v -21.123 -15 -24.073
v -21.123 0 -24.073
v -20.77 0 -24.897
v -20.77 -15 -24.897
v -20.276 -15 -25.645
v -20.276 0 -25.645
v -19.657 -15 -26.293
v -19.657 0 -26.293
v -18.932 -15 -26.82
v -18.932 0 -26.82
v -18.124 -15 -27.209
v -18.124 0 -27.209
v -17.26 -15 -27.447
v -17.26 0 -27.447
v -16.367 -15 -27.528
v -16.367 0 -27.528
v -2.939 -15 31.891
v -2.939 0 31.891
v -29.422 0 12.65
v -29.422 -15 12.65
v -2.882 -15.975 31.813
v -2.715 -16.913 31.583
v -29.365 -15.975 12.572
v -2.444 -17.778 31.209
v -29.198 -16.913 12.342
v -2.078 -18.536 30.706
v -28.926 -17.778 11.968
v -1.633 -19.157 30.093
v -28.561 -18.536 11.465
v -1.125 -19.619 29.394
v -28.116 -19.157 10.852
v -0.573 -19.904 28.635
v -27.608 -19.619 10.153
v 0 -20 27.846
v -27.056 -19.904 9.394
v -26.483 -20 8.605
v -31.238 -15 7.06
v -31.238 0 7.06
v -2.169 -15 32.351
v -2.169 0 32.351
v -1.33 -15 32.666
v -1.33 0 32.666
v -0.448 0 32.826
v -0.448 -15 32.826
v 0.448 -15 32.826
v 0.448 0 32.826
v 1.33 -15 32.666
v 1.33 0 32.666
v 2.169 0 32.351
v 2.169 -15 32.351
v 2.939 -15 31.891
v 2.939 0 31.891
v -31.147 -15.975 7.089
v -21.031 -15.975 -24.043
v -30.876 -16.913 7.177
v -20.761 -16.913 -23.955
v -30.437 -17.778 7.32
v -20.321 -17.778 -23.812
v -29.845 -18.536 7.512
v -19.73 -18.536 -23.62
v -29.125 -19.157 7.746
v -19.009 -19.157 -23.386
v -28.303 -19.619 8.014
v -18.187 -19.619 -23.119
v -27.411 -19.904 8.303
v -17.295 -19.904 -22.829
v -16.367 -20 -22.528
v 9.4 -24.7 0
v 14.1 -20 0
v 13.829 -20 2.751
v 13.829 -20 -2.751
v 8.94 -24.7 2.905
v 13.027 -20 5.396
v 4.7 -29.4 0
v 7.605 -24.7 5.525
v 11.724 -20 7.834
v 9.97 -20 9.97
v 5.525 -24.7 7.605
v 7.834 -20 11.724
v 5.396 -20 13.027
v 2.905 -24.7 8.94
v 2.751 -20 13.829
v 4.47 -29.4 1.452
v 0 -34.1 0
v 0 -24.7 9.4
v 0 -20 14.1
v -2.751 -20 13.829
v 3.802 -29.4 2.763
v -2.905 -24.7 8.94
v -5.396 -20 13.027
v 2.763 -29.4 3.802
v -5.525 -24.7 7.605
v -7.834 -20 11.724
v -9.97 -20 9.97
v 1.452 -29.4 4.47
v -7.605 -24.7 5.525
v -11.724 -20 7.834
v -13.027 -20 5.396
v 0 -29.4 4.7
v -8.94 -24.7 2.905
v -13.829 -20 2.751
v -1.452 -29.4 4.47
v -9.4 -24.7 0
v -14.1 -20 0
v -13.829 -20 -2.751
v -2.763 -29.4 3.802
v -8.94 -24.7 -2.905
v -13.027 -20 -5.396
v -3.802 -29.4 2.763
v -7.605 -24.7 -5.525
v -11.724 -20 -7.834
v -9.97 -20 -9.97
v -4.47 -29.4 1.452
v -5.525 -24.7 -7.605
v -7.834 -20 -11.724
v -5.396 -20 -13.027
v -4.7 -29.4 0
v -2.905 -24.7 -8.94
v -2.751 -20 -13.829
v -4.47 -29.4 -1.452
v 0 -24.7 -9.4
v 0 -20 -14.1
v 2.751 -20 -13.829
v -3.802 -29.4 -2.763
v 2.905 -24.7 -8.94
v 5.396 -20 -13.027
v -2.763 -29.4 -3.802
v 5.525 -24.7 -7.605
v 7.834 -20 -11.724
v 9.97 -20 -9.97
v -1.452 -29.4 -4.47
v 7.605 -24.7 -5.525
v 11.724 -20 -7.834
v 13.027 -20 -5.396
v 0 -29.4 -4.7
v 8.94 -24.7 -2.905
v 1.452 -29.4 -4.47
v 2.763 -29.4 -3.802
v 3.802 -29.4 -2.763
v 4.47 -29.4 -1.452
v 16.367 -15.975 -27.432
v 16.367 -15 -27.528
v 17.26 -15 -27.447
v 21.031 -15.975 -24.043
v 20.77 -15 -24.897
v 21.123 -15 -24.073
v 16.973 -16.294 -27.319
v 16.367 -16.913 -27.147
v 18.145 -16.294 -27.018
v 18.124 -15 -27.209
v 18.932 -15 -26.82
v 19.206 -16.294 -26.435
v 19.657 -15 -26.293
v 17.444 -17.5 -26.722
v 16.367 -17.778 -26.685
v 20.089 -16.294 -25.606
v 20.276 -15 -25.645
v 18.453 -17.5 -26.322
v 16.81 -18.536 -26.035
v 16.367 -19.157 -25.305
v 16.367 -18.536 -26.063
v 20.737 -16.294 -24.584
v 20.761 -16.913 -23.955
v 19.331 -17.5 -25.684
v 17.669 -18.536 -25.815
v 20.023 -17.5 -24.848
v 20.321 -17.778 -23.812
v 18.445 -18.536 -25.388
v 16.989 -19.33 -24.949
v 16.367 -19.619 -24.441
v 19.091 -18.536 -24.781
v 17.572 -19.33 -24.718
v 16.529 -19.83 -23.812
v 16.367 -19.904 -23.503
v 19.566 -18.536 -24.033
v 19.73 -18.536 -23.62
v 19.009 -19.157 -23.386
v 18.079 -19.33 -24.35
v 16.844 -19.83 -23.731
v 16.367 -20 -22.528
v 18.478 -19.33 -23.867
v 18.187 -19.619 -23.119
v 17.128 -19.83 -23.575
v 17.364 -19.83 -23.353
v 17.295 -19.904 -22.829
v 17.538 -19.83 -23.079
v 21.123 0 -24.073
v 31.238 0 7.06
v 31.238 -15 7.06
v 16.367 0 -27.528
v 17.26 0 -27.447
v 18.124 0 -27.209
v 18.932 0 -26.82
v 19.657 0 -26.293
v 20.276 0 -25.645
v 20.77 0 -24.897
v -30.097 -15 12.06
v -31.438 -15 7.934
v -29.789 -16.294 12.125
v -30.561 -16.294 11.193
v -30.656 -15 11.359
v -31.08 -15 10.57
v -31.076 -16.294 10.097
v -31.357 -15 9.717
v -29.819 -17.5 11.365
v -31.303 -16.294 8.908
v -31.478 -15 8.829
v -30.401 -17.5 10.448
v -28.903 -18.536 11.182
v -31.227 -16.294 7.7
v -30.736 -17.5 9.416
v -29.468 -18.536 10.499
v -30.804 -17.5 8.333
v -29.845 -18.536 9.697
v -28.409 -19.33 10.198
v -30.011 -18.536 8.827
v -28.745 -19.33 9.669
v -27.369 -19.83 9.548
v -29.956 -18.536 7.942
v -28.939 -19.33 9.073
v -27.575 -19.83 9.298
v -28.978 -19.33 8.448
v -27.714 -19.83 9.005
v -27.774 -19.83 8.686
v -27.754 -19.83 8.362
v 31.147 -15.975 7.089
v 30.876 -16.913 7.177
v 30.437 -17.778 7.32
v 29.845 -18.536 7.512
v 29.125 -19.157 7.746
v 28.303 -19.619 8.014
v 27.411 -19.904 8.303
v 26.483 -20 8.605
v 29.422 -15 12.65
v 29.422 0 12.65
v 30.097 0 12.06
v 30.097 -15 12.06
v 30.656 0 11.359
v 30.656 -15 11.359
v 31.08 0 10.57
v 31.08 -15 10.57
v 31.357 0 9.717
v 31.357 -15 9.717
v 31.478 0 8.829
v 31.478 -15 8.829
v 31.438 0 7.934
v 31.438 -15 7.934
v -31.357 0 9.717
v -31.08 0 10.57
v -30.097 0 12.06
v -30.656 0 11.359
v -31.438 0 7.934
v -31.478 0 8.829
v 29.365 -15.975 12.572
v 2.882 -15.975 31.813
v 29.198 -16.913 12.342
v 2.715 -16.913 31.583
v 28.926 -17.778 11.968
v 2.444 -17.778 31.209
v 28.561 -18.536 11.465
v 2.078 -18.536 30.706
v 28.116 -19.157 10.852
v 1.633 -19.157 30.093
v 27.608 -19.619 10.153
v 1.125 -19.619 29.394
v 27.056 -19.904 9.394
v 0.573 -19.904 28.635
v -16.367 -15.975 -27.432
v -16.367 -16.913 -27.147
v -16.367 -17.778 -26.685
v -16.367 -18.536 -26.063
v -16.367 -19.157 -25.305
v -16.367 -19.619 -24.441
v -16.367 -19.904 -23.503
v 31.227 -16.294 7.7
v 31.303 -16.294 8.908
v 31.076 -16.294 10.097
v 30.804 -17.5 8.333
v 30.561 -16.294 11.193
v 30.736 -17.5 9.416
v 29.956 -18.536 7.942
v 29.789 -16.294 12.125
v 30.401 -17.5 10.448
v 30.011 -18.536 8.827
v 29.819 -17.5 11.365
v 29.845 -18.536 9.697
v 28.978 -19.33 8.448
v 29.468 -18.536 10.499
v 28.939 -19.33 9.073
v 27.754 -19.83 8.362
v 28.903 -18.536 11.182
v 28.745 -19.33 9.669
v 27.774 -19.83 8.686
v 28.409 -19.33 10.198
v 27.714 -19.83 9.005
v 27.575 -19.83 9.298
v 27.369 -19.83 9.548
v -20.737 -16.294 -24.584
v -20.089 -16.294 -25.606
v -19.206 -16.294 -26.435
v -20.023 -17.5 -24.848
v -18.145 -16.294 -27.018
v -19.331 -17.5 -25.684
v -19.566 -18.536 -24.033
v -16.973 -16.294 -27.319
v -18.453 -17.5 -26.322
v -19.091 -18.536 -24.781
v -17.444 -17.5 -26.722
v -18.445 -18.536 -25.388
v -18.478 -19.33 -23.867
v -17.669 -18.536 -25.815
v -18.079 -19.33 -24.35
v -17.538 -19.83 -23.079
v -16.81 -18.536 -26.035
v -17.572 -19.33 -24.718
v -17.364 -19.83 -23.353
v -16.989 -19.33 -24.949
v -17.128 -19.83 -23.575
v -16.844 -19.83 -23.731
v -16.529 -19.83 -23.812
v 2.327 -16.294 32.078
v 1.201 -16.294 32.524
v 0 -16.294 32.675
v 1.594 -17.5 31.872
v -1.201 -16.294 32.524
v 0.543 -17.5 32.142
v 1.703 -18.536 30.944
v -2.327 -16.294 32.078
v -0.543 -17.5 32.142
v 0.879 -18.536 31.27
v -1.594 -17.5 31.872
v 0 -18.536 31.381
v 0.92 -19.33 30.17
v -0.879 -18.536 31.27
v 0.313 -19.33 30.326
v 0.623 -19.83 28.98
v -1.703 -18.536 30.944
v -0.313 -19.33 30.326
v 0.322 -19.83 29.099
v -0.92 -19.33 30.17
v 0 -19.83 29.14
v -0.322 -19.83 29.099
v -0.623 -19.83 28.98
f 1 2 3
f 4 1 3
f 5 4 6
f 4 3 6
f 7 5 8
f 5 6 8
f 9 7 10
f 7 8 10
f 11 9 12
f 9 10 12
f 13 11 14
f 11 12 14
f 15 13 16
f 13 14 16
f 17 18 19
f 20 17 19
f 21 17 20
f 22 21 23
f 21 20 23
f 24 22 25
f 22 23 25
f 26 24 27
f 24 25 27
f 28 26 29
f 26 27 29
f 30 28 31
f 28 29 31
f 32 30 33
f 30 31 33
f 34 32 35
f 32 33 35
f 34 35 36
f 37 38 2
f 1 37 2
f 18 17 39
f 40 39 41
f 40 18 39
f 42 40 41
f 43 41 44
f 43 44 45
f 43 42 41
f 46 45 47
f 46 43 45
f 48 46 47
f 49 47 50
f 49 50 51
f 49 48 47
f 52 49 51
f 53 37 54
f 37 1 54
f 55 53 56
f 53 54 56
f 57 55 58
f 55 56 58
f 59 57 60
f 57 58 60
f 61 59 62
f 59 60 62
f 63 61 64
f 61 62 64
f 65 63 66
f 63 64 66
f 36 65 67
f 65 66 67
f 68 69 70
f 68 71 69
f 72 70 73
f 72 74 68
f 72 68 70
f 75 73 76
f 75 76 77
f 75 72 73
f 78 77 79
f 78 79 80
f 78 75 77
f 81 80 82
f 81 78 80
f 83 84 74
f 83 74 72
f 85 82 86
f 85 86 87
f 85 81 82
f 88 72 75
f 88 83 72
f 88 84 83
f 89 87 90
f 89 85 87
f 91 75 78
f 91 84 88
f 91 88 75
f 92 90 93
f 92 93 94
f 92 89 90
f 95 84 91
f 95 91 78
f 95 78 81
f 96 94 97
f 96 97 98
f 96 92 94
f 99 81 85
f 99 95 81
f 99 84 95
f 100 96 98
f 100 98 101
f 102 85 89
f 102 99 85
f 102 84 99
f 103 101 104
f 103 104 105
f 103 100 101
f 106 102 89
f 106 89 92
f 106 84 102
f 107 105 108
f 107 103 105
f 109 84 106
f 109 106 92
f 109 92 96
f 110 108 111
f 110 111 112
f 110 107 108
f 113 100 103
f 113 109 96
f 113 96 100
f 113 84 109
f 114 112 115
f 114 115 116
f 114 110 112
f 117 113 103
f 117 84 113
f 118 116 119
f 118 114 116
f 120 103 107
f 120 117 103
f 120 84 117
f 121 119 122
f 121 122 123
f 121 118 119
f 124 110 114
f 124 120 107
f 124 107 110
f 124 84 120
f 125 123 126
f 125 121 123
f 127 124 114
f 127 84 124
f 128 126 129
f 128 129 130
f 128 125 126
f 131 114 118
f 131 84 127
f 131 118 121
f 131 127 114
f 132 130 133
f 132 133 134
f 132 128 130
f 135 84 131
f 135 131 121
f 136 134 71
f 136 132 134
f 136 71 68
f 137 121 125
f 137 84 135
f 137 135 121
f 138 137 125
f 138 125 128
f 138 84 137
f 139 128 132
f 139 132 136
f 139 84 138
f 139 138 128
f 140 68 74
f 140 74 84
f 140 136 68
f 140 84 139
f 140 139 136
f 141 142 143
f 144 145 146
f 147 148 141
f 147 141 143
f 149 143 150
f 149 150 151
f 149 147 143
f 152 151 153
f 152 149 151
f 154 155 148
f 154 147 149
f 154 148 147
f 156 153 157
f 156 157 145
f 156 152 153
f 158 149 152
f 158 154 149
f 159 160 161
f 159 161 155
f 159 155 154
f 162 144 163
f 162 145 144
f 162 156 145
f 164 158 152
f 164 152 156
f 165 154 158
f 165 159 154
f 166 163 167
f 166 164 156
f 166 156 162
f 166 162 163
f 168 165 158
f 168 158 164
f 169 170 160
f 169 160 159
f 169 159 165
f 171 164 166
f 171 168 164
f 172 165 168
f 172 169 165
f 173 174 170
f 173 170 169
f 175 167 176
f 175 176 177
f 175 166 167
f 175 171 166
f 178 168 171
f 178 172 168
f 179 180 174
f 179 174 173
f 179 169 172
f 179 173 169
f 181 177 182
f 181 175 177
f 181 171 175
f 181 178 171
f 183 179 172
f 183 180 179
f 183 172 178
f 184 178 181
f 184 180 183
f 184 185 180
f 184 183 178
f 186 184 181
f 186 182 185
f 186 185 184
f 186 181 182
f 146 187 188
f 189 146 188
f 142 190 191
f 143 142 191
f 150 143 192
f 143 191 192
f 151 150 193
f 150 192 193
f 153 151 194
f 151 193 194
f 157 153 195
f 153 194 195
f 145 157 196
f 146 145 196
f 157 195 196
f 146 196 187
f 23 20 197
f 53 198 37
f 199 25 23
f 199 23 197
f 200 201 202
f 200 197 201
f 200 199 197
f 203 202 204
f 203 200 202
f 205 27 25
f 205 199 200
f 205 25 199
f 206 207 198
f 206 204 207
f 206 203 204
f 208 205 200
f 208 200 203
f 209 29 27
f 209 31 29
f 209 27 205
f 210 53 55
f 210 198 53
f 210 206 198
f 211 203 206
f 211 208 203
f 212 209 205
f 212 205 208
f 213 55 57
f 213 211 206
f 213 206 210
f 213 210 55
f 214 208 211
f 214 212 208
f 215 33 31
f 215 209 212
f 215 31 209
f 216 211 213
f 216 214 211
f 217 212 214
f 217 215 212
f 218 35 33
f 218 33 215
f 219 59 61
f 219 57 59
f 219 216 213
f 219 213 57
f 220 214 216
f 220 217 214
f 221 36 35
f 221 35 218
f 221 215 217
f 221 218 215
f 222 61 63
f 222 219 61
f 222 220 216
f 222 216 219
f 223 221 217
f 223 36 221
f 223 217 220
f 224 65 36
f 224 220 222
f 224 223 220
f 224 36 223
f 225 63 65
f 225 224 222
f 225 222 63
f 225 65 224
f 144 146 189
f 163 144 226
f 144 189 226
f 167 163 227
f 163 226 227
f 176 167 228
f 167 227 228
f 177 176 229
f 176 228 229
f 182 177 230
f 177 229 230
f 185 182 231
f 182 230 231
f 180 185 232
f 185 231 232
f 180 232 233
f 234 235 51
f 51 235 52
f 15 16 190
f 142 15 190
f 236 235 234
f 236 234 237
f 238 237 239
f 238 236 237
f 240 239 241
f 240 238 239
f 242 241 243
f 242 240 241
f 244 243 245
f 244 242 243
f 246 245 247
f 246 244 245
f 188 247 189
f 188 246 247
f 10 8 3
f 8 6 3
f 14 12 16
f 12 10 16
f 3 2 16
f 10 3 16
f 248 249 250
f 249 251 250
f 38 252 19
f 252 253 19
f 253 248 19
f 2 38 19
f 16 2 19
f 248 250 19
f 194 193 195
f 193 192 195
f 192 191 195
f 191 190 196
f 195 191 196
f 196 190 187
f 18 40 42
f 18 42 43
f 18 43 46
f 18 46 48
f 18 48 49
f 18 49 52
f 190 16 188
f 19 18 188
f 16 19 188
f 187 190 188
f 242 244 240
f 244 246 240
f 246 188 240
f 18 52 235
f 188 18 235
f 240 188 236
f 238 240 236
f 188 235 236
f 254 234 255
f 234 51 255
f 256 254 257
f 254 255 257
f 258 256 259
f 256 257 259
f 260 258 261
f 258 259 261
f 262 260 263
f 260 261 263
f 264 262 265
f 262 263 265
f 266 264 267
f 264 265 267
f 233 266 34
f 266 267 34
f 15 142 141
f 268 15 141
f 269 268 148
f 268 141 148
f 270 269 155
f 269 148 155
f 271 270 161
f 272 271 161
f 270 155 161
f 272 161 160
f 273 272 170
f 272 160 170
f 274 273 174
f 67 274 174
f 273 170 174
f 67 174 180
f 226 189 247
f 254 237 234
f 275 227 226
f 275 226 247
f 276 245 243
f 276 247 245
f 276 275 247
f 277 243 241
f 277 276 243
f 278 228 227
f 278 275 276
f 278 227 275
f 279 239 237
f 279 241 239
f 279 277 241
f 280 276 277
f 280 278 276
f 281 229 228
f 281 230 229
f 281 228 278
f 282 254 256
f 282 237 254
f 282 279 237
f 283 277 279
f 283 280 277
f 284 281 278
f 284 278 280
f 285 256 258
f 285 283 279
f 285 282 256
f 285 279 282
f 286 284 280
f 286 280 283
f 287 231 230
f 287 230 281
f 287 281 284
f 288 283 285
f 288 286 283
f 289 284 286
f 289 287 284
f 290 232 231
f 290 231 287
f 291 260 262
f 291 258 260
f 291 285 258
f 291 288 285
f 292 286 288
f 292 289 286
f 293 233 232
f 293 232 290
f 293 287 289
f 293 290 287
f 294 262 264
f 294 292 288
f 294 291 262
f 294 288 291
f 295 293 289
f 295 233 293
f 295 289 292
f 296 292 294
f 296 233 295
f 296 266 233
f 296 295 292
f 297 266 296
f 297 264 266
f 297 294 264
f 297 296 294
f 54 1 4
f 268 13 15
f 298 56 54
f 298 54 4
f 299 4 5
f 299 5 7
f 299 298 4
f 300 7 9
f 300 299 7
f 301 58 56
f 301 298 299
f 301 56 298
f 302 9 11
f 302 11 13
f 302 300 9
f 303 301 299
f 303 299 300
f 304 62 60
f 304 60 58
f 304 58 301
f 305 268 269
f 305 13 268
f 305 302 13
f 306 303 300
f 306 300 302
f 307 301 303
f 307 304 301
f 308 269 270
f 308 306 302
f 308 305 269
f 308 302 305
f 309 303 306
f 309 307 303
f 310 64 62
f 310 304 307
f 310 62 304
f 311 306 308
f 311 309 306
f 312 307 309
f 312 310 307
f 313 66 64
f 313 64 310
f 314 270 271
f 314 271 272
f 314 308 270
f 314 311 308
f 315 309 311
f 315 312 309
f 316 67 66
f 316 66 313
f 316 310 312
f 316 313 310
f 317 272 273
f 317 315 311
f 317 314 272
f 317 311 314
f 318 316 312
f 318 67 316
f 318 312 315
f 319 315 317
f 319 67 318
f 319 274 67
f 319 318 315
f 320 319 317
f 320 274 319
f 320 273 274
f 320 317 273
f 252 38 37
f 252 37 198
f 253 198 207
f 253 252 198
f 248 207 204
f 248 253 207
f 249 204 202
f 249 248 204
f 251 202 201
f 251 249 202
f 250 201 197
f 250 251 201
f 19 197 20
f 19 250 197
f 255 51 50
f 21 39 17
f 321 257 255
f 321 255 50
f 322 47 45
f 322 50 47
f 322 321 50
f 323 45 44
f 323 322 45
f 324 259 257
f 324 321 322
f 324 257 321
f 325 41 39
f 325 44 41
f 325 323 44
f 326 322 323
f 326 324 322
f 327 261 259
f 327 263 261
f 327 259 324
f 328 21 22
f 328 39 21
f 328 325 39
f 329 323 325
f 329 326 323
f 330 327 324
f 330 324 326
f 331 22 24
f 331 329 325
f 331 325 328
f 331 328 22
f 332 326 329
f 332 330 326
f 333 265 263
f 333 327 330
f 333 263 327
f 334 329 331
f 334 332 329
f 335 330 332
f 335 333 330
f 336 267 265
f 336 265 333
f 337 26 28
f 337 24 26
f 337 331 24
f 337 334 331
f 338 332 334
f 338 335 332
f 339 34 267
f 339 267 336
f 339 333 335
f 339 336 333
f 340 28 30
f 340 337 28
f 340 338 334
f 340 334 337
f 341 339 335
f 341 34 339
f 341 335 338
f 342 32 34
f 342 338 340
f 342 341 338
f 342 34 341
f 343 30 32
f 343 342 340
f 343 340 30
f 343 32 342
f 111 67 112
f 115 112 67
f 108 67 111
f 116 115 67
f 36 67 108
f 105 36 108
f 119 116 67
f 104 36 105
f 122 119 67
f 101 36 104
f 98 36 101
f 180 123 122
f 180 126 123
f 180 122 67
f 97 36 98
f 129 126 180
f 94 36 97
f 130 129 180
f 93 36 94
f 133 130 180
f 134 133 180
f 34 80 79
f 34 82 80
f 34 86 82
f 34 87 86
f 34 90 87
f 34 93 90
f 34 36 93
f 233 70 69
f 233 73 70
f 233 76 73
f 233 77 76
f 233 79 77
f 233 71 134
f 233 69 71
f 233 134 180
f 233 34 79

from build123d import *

# Parameters (mm, degrees)
F0_R         = 15
F1_DEPTH     = 20
F2_R         = 5
F3_T1_DEPTH  = 24.0817816001
F3_T6_DEPTH  = 5
F3_T12_DEPTH = 5
F3_T18_DEPTH = 5
F3_T24_DEPTH = 5
F3_T30_DEPTH = 5
F4_DEPTH     = 34.1


# Not quite as in the source:
# - a fillet or chamfer that OpenCascade refuses, or shapes differently, is made with other operations: its cross-section is extruded or revolved along the edge and cut away or added


with BuildPart() as f1:
    # F0 (on Front) → F1 (new body)
    with BuildSketch(Plane.XZ):
        Polygon((-20, -27.5276384094), (20, -27.5276384094), (32.360679775, 10.5146222424), (0, 34.0260323341), (-32.360679775, 10.5146222424), align=None)
        Circle(F0_R, mode=Mode.SUBTRACT)
    extrude(amount=F1_DEPTH)

    # F2
    f2_edges = [f1.edges().sort_by_distance(p)[0] for p in [
        (-26.18034, -20, -8.506508),
        (0, -20, -27.527638),
        (26.18034, -20, -8.506508),
        (16.18034, -20, 22.270327),
        (-16.18034, -20, 22.270327),
    ]]
    fillet(f2_edges, radius=F2_R)

    # F3: fillet of radius 5 on 5 edges, made by hand

    # F3_s2 → F3_t1 (cut)
    with BuildSketch(Plane.XZ.offset(-9.0817816001)):
        with BuildLine():
            ThreePointArc((16.36728736, -27.5276384094), (19.3062136214, -26.5727233813), (21.1225699414, -24.0727233813))
            Line((21.1225699414, -24.0727233813), (20, -27.5276384094))
            Line((20, -27.5276384094), (16.36728736, -27.5276384094))
        make_face()
        with BuildLine():
            ThreePointArc((29.4217535135, 12.649877158), (31.2381098335, 10.149877158), (31.2381098335, 7.0597072143))
            Line((31.2381098335, 7.0597072143), (32.360679775, 10.5146222424))
            Line((32.360679775, 10.5146222424), (29.4217535135, 12.649877158))
        make_face()
        with BuildLine():
            ThreePointArc((-2.9389262615, 31.8907774185), (0, 32.8456924466), (2.9389262615, 31.8907774185))
            Line((2.9389262615, 31.8907774185), (0, 34.0260323341))
            Line((0, 34.0260323341), (-2.9389262615, 31.8907774185))
        make_face()
        with BuildLine():
            ThreePointArc((-31.2381098335, 7.0597072143), (-31.2381098335, 10.149877158), (-29.4217535135, 12.649877158))
            Line((-29.4217535135, 12.649877158), (-32.360679775, 10.5146222424))
            Line((-32.360679775, 10.5146222424), (-31.2381098335, 7.0597072143))
        make_face()
        with BuildLine():
            ThreePointArc((-21.1225699414, -24.0727233813), (-19.3062136214, -26.5727233813), (-16.36728736, -27.5276384094))
            Line((-16.36728736, -27.5276384094), (-20, -27.5276384094))
            Line((-20, -27.5276384094), (-21.1225699414, -24.0727233813))
        make_face()
    extrude(amount=F3_T1_DEPTH, mode=Mode.SUBTRACT)


with BuildPart() as f3_tool4:
    # F3_s5 → F3_t6 (new body)
    with BuildSketch(Plane.XZ.offset(15)):
        Polygon((-16.36728736, -22.5276384094), (-21.1225699414, -24.0727233813), (-20, -27.5276384094), (-16.36728736, -27.5276384094), align=None)
    extrude(amount=F3_T6_DEPTH)

    # F3_s7 → F3_t8 (revolve, cut)
    with BuildSketch(Plane(origin=(-16.36728736, -15, -22.5276384094), x_dir=(0.5877852523, 0, 0.8090169944), z_dir=(0.8090169944, 0, -0.5877852523))):
        with BuildLine():
            ThreePointArc((0, -5), (5, 0), (0, 5))
            Line((0, 5), (0, -5))
        make_face()
    revolve(axis=Axis((-16.36728736, -15, -22.5276384094), (0, -1, 0)), mode=Mode.SUBTRACT)


with BuildPart() as f1_1:
    add(f1.part)

    # F3_t3: cut F3_tool4
    add(f3_tool4.part, mode=Mode.SUBTRACT)


with BuildPart() as f3_tool10:
    # F3_s11 → F3_t12 (new body)
    with BuildSketch(Plane.XZ.offset(15)):
        Polygon((-26.4828272521, 8.6047921861), (-31.2381098335, 7.0597072143), (-32.360679775, 10.5146222424), (-29.4217535135, 12.649877158), align=None)
    extrude(amount=F3_T12_DEPTH)

    # F3_s13 → F3_t14 (revolve, cut)
    with BuildSketch(Plane(origin=(-26.4828272521, -15, 8.6047921861), x_dir=(0.9510565163, 0, -0.3090169944), z_dir=(-0.3090169944, 0, -0.9510565163))):
        with BuildLine():
            ThreePointArc((0, -5), (5, 0), (0, 5))
            Line((0, 5), (0, -5))
        make_face()
    revolve(axis=Axis((-26.4828272521, -15, 8.6047921861), (0, -1, 0)), mode=Mode.SUBTRACT)


with BuildPart() as f1_2:
    add(f1_1.part)

    # F3_t9: cut F3_tool10
    add(f3_tool10.part, mode=Mode.SUBTRACT)


with BuildPart() as f3_tool16:
    # F3_s17 → F3_t18 (new body)
    with BuildSketch(Plane.XZ.offset(15)):
        Polygon((0, 27.8456924466), (-2.9389262615, 31.8907774185), (0, 34.0260323341), (2.9389262615, 31.8907774185), align=None)
    extrude(amount=F3_T18_DEPTH)

    # F3_s19 → F3_t20 (revolve, cut)
    with BuildSketch(Plane(origin=(0, -15, 27.8456924466), x_dir=(0, 0, -1), z_dir=(-1, 0, 0))):
        with BuildLine():
            ThreePointArc((0, -5), (5, 0), (0, 5))
            Line((0, 5), (0, -5))
        make_face()
    revolve(axis=Axis((0, -15, 27.8456924466), (0, -1, 0)), mode=Mode.SUBTRACT)


with BuildPart() as f1_3:
    add(f1_2.part)

    # F3_t15: cut F3_tool16
    add(f3_tool16.part, mode=Mode.SUBTRACT)


with BuildPart() as f3_tool22:
    # F3_s23 → F3_t24 (new body)
    with BuildSketch(Plane.XZ.offset(15)):
        Polygon((26.4828272521, 8.6047921861), (29.4217535135, 12.649877158), (32.360679775, 10.5146222424), (31.2381098335, 7.0597072143), align=None)
    extrude(amount=F3_T24_DEPTH)

    # F3_s25 → F3_t26 (revolve, cut)
    with BuildSketch(Plane(origin=(26.4828272521, -15, 8.6047921861), x_dir=(-0.9510565163, 0, -0.3090169944), z_dir=(-0.3090169944, 0, 0.9510565163))):
        with BuildLine():
            ThreePointArc((0, -5), (5, 0), (0, 5))
            Line((0, 5), (0, -5))
        make_face()
    revolve(axis=Axis((26.4828272521, -15, 8.6047921861), (0, -1, 0)), mode=Mode.SUBTRACT)


with BuildPart() as f1_4:
    add(f1_3.part)

    # F3_t21: cut F3_tool22
    add(f3_tool22.part, mode=Mode.SUBTRACT)


with BuildPart() as f3_tool28:
    # F3_s29 → F3_t30 (new body)
    with BuildSketch(Plane.XZ.offset(15)):
        Polygon((16.36728736, -22.5276384094), (16.36728736, -27.5276384094), (20, -27.5276384094), (21.1225699414, -24.0727233813), align=None)
    extrude(amount=F3_T30_DEPTH)

    # F3_s31 → F3_t32 (revolve, cut)
    with BuildSketch(Plane(origin=(16.36728736, -15, -22.5276384094), x_dir=(-0.5877852523, 0, 0.8090169944), z_dir=(0.8090169944, 0, 0.5877852523))):
        with BuildLine():
            ThreePointArc((0, -5), (5, 0), (0, 5))
            Line((0, 5), (0, -5))
        make_face()
    revolve(axis=Axis((16.36728736, -15, -22.5276384094), (0, -1, 0)), mode=Mode.SUBTRACT)


with BuildPart() as f1_5:
    add(f1_4.part)

    # F3_t27: cut F3_tool28
    add(f3_tool28.part, mode=Mode.SUBTRACT)

    # F0 (on Front) → F4 (join)
    with BuildSketch(Plane.XZ):
        Circle(F0_R)
    extrude(amount=F4_DEPTH)

    # F5: chamfer of 15 on 1 edges, made by hand


with BuildPart() as f5_tool2:
    # F5_s3 → F5_t4 (revolve)
    with BuildSketch(Plane.XY):
        Polygon((15, -19.1), (0, -34.1), (15, -34.1), align=None)
    revolve(axis=Axis((0, -34.1, 0), (0, -1, 0)))

    split(bisect_by=Plane.XZ.offset(20), keep=Keep.TOP)


with BuildPart() as f1_6:
    add(f1_5.part)

    # F5_t1: cut F5_tool2
    add(f5_tool2.part, mode=Mode.SUBTRACT)


solid = f1_6.part
